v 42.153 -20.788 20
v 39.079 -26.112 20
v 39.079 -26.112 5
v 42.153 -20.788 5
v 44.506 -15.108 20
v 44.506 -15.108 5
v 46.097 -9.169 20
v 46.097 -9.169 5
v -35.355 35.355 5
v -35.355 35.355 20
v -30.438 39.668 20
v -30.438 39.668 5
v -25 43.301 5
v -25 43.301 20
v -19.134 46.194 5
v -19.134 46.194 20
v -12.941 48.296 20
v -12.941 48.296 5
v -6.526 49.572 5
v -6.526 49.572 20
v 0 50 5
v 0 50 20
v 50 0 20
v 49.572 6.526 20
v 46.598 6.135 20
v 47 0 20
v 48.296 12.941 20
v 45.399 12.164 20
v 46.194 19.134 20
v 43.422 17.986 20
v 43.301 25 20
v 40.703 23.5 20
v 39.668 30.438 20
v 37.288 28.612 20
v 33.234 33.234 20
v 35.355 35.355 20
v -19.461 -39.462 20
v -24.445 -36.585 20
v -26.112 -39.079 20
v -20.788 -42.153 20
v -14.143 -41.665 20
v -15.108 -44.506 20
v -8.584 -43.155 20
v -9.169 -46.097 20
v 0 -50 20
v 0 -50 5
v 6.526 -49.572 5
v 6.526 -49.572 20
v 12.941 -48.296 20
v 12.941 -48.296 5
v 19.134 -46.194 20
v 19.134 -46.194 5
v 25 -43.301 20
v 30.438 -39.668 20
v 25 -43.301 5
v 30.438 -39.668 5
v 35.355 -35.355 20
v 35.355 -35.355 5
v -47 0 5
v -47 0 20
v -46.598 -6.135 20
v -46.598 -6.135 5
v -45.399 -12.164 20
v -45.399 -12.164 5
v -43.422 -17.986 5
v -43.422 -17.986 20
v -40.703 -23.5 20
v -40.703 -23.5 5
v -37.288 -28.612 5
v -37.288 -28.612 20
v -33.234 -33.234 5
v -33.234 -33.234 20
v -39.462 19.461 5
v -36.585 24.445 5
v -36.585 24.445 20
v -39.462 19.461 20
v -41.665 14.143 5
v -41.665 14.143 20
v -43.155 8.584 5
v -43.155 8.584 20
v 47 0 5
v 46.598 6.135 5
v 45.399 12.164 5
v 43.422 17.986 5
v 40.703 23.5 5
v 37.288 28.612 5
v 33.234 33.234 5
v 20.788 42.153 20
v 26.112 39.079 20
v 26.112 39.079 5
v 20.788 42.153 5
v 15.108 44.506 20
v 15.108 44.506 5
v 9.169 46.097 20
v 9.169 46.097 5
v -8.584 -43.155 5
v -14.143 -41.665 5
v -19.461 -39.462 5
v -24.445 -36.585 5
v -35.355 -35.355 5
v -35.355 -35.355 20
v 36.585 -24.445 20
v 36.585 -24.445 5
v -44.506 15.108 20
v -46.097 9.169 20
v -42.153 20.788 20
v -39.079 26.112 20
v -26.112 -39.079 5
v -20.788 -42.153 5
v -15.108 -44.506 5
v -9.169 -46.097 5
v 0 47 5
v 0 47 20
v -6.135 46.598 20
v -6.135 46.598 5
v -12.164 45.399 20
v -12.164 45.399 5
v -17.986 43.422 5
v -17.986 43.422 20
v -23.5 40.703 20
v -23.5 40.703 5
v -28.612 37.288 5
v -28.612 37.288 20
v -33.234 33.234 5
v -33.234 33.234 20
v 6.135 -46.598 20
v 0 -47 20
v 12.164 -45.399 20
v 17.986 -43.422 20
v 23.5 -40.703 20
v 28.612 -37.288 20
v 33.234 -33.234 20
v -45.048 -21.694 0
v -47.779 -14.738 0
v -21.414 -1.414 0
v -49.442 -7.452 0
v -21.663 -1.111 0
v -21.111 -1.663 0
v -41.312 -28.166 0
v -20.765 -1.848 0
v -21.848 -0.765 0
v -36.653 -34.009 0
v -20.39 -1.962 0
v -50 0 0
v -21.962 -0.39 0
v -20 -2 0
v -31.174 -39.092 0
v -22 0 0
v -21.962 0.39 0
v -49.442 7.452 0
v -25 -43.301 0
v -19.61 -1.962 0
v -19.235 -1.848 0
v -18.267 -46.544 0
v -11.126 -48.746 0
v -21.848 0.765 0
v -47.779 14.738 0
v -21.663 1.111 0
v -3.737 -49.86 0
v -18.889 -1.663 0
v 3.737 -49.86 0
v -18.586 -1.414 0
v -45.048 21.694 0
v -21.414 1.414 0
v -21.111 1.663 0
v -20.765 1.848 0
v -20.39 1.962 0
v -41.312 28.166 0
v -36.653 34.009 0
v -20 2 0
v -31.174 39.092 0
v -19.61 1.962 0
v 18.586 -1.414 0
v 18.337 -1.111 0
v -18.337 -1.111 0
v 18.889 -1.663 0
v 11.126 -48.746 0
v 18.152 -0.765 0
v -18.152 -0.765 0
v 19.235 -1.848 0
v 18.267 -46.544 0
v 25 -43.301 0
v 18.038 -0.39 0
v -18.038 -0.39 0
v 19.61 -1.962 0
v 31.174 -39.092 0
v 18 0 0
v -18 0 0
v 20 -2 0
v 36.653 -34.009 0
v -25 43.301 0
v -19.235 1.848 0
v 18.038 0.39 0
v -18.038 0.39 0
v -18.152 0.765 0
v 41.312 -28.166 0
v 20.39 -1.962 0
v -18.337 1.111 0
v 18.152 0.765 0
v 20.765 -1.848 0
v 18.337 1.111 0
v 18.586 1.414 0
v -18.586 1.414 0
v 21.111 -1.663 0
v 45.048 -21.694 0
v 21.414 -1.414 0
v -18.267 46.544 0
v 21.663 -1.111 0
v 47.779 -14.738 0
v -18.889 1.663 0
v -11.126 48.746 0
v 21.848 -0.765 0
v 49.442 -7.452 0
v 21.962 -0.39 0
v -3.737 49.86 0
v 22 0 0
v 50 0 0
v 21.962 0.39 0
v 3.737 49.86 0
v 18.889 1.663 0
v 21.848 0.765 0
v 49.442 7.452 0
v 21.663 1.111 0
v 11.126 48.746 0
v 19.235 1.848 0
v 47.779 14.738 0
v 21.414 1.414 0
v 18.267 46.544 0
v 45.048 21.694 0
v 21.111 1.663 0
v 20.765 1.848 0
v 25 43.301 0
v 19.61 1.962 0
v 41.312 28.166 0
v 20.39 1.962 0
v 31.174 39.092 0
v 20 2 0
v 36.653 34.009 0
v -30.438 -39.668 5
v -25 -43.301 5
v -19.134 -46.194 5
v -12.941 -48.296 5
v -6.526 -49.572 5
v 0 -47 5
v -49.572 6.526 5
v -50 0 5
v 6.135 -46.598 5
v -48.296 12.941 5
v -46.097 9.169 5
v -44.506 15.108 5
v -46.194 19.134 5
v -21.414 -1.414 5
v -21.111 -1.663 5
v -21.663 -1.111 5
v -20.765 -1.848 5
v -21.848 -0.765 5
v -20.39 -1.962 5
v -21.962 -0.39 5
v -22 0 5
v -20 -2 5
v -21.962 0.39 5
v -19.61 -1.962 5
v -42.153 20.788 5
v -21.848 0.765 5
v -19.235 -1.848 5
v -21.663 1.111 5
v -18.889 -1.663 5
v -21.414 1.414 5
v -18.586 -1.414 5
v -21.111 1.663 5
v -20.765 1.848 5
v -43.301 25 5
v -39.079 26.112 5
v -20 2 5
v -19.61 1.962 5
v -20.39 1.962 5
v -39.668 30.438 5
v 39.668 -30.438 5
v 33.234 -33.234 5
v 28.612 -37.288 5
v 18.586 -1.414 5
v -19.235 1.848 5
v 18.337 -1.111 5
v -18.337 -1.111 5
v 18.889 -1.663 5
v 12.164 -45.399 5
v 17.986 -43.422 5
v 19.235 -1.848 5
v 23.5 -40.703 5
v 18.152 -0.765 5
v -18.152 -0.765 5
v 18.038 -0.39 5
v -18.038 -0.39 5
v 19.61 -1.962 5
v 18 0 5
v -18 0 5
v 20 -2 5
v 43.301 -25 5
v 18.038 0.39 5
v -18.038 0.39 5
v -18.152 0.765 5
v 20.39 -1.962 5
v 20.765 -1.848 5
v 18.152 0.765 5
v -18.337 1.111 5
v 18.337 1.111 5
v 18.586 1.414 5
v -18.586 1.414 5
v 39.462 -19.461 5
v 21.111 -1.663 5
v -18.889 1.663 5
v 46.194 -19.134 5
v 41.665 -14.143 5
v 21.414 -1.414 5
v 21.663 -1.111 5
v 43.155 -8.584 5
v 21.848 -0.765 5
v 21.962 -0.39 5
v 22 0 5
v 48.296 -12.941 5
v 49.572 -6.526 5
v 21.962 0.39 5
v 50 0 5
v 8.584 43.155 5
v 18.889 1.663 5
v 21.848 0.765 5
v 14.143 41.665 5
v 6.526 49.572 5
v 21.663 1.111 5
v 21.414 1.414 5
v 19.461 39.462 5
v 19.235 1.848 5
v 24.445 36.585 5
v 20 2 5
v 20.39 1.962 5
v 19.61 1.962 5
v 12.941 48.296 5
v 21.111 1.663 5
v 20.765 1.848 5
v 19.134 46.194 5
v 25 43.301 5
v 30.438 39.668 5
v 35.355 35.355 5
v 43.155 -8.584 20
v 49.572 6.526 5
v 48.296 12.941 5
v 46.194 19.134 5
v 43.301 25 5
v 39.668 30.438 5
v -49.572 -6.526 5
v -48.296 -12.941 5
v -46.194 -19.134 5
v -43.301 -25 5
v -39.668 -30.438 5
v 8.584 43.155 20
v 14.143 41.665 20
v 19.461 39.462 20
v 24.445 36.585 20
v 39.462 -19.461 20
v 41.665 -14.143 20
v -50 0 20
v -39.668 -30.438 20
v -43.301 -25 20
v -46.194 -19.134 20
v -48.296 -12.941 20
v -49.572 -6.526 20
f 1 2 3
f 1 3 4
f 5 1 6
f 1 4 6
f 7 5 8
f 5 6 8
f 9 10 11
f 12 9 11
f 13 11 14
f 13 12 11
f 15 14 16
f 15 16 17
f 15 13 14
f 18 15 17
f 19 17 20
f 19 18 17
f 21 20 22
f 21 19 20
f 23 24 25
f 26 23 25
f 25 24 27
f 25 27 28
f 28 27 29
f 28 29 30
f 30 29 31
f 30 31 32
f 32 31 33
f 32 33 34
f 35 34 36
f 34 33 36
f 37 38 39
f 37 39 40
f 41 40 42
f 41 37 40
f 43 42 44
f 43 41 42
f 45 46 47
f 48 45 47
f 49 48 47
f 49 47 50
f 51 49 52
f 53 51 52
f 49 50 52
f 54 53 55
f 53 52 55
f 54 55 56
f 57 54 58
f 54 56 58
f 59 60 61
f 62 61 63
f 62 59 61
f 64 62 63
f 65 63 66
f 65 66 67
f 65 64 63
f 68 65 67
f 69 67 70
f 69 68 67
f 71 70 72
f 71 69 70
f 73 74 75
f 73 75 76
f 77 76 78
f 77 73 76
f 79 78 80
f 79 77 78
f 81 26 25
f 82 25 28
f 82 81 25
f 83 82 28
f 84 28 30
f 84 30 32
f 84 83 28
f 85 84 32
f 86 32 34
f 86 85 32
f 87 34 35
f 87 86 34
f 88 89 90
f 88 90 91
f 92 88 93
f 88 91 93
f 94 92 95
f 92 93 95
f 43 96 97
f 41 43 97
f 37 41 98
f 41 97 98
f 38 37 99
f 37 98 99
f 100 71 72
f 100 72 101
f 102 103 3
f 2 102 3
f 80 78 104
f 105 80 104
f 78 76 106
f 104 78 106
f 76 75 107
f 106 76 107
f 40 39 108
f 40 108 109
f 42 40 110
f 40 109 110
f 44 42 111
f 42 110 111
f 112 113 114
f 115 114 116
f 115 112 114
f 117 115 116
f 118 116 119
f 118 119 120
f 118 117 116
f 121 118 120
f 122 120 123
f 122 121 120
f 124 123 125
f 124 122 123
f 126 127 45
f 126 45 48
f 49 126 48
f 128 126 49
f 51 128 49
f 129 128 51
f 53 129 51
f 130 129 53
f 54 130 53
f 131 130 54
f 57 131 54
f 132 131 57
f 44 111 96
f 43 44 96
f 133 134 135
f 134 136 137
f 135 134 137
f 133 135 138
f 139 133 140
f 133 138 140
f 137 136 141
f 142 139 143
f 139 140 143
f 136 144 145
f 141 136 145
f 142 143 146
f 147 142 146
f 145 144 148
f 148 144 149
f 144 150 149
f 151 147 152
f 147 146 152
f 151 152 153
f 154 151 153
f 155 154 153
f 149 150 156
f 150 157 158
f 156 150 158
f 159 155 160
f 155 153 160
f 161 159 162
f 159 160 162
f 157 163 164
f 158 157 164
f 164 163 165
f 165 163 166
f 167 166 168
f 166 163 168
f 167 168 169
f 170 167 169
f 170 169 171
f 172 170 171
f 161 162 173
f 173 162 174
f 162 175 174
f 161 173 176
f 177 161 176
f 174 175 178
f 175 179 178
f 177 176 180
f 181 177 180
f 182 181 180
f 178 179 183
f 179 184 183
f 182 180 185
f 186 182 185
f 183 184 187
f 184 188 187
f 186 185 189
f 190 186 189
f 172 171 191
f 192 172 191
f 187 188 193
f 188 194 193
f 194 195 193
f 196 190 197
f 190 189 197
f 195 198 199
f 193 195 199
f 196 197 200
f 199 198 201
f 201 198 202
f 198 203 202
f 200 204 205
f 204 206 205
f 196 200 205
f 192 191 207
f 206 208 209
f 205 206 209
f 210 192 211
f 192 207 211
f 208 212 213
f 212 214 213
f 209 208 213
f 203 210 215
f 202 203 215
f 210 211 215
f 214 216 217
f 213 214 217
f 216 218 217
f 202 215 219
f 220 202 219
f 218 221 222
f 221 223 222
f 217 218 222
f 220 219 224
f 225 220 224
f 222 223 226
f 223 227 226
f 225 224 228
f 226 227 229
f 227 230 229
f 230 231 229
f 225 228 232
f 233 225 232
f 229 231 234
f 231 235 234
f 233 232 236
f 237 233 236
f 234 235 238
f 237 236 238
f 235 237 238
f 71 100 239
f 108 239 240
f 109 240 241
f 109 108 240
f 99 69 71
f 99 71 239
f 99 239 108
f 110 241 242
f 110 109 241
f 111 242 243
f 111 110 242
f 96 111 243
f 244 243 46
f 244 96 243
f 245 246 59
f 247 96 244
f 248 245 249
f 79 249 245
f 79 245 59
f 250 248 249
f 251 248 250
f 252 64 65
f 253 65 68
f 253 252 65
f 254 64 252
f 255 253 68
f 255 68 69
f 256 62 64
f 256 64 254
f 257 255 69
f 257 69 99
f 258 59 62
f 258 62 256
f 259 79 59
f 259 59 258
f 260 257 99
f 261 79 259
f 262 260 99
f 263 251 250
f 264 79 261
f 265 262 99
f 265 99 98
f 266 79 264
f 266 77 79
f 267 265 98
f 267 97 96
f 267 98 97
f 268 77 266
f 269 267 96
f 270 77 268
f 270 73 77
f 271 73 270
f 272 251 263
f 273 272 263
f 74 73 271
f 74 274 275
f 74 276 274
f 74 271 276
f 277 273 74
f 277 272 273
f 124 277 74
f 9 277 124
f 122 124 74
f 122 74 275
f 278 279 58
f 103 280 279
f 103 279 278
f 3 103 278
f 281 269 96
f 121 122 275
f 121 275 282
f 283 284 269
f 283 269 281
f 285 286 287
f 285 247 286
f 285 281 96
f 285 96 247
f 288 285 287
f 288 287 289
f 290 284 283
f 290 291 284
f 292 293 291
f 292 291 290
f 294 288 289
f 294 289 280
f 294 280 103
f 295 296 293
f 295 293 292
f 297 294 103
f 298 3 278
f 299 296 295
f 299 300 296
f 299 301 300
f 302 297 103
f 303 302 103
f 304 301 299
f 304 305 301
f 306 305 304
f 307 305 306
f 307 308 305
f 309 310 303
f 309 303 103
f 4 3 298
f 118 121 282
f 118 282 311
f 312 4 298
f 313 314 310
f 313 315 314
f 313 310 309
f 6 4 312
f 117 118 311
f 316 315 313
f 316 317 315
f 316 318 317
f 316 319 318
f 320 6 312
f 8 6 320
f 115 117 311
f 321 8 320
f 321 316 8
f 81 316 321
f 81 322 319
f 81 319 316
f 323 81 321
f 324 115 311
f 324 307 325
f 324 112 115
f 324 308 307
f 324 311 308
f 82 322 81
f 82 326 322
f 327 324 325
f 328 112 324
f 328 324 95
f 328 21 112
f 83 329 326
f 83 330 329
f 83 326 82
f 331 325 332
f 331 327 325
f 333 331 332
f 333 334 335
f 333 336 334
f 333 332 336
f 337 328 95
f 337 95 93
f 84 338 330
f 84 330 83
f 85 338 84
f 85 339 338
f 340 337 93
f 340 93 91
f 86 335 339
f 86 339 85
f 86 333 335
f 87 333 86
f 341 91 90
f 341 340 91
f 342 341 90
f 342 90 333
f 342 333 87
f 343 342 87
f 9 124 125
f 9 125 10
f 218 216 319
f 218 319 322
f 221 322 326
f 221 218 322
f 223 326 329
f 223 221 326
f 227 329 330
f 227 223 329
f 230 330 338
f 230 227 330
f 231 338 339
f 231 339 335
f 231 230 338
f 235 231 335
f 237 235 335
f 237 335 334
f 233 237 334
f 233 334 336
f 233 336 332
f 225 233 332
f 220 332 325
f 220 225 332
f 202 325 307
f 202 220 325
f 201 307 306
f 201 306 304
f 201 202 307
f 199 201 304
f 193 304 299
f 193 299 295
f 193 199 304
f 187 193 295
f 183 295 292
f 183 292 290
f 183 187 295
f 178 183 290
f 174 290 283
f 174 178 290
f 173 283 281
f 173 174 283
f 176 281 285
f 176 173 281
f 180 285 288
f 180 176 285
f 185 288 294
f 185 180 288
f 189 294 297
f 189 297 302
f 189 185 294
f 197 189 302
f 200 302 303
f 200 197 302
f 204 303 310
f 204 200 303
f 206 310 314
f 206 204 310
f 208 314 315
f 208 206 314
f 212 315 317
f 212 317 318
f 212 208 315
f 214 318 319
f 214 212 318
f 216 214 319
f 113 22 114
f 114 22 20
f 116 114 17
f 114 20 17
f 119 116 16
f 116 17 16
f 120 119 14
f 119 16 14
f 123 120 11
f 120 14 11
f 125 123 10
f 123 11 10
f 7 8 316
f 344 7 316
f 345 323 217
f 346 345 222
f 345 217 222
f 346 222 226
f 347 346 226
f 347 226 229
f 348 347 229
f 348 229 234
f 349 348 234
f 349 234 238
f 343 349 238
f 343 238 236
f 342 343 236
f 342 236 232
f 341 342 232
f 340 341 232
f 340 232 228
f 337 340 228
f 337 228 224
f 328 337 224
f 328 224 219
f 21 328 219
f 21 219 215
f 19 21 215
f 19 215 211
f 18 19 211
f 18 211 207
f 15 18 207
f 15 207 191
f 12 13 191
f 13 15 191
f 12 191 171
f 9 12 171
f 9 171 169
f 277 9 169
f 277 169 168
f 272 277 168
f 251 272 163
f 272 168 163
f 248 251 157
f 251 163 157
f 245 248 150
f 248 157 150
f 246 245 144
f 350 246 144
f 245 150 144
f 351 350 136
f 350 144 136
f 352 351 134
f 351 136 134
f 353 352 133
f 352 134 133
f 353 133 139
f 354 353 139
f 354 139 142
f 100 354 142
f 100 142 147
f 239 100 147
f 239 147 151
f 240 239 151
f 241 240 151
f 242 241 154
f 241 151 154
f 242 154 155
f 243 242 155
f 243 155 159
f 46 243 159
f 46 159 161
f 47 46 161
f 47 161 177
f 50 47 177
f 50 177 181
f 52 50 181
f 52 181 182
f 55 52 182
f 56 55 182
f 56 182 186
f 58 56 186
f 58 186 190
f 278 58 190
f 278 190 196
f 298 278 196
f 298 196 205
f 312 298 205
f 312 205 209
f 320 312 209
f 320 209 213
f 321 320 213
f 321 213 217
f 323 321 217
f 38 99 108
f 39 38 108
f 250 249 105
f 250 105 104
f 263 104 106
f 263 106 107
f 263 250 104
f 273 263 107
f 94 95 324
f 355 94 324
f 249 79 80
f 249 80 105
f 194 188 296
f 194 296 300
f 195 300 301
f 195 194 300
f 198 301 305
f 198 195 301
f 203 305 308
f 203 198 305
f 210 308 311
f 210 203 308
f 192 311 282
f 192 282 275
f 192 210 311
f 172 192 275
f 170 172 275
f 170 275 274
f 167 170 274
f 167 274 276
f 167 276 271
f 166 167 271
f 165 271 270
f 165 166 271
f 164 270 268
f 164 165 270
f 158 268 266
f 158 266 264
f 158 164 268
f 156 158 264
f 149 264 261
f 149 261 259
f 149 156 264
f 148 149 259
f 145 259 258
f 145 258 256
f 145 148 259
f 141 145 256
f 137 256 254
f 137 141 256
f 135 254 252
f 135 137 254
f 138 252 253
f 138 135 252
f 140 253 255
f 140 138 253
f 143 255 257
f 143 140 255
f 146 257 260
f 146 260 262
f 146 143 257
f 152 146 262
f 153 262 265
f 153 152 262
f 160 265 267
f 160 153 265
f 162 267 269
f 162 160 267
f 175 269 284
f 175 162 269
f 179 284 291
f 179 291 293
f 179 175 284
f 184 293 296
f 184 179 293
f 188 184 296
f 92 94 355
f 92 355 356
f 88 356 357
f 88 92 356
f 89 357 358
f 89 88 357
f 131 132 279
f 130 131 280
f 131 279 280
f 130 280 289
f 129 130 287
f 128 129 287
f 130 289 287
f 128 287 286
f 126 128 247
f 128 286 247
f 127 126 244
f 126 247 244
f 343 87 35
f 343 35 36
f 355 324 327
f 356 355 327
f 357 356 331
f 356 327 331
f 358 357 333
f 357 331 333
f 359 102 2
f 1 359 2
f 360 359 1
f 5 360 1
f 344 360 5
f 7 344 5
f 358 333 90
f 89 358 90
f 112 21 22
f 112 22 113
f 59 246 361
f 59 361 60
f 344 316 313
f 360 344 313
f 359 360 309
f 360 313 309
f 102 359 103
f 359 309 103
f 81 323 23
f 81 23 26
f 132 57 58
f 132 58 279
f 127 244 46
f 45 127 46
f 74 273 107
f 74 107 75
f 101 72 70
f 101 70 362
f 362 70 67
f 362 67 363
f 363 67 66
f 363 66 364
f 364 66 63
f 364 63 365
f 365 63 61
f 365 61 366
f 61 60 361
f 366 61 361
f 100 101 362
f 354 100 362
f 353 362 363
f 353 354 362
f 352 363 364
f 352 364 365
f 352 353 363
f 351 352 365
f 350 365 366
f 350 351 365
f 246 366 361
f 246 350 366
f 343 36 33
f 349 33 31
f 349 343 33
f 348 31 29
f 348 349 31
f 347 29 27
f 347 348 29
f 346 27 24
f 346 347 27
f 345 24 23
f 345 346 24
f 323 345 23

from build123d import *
from build123d.topology import SkipClean

# Parameters (mm, degrees)
SKETCH_1_R      = 50
SKETCH_1_R_2    = 2
EXTRUDE_1_DEPTH = 5
EXTRUDE_2_DEPTH = 15
EXTRUDE_3_DEPTH = 15
EXTRUDE_4_DEPTH = 15


with BuildPart() as part:
    # 草图1 → 凸台-拉伸1 (new body)
    with BuildSketch(Plane.XY):
        Circle(SKETCH_1_R)
        with Locations((-20, 0)):
            Circle(SKETCH_1_R_2, mode=Mode.SUBTRACT)
        with Locations((20, 0)):
            Circle(SKETCH_1_R_2, mode=Mode.SUBTRACT)
    extrude(amount=EXTRUDE_1_DEPTH)

    # 草图2 → 凸台-拉伸2 (add)
    with SkipClean():  # the faces are left unmerged after this step: merging them gives an invalid solid
        with BuildSketch(Plane.XY.offset(5)):
            with BuildLine():
                Line((0, 50), (0, 47))
                ThreePointArc((0, 47), (-17.986121321, 43.422338028), (-33.234018716, 33.234018716))
                Line((-33.234018716, 33.234018716), (-35.355339059, 35.355339059))
                ThreePointArc((-35.355339059, 35.355339059), (-19.134171618, 46.193976626), (0, 50))
            make_face()
        extrude(amount=EXTRUDE_2_DEPTH)

    # 草图5 → 凸台-拉伸3 (add)
    with SkipClean():  # the faces are left unmerged after this step: merging them gives an invalid solid
        with BuildSketch(Plane.XY.offset(5)):
            with BuildLine():
                Line((-35.355339059, 35.355339059), (-33.234018716, 33.234018716))
                ThreePointArc((-33.234018716, 33.234018716), (-17.986121321, 43.422338028), (0, 47))
                Line((0, 47), (0, 50))
                ThreePointArc((0, 50), (-19.134171618, 46.193976626), (-35.355339059, 35.355339059))
            make_face()
            with BuildLine():
                Line((-50, 0), (-47, 0))
                ThreePointArc((-47, 0), (-43.422338028, -17.986121321), (-33.234018716, -33.234018716))
                Line((-33.234018716, -33.234018716), (-35.355339059, -35.355339059))
                ThreePointArc((-35.355339059, -35.355339059), (-46.193976626, -19.134171618), (-50, 0))
            make_face()
            with BuildLine():
                Line((33.234018716, 33.234018716), (35.355339059, 35.355339059))
                ThreePointArc((35.355339059, 35.355339059), (46.193976626, 19.134171618), (50, 0))
                Line((50, 0), (47, 0))
                ThreePointArc((47, 0), (43.422338028, 17.986121321), (33.234018716, 33.234018716))
            make_face()
            with BuildLine():
                Line((0, -47), (0, -50))
                ThreePointArc((0, -50), (19.134171618, -46.193976626), (35.355339059, -35.355339059))
                Line((35.355339059, -35.355339059), (33.234018716, -33.234018716))
                ThreePointArc((33.234018716, -33.234018716), (17.986121321, -43.422338028), (0, -47))
            make_face()
        extrude(amount=EXTRUDE_3_DEPTH)

    # 草图6 → 凸台-拉伸4 (add)
    with SkipClean():  # the faces are left unmerged after this step: merging them gives an invalid solid
        with BuildSketch(Plane.XY.offset(5)):
            with BuildLine():
                Line((-39.079071778, 26.111800952), (-36.584662941, 24.445090253))
                ThreePointArc((-36.584662941, 24.445090253), (-40.65069943, 16.838071024), (-43.154552338, 8.583974169))
                Line((-43.154552338, 8.583974169), (-46.096908179, 9.169245135))
                ThreePointArc((-46.096908179, 9.169245135), (-43.422338028, 17.986121321), (-39.079071778, 26.111800952))
            make_face()
            with BuildLine():
                Line((9.169245135, 46.096908179), (8.583974169, 43.154552338))
                ThreePointArc((8.583974169, 43.154552338), (16.838071024, 40.65069943), (24.445090253, 36.584662941))
                Line((24.445090253, 36.584662941), (26.111800952, 39.079071778))
                ThreePointArc((26.111800952, 39.079071778), (17.986121321, 43.422338028), (9.169245135, 46.096908179))
            make_face()
            with BuildLine():
                Line((46.096908179, -9.169245135), (43.154552338, -8.583974169))
                ThreePointArc((43.154552338, -8.583974169), (40.65069943, -16.838071024), (36.584662941, -24.445090253))
                Line((36.584662941, -24.445090253), (39.079071778, -26.111800952))
                ThreePointArc((39.079071778, -26.111800952), (43.422338028, -17.986121321), (46.096908179, -9.169245135))
            make_face()
            with BuildLine():
                Line((-9.169245135, -46.096908179), (-8.583974169, -43.154552338))
                ThreePointArc((-8.583974169, -43.154552338), (-16.838071024, -40.65069943), (-24.445090253, -36.584662941))
                Line((-24.445090253, -36.584662941), (-26.111800952, -39.079071778))
                ThreePointArc((-26.111800952, -39.079071778), (-17.986121321, -43.422338028), (-9.169245135, -46.096908179))
            make_face()
        extrude(amount=EXTRUDE_4_DEPTH)


solid = part.part
